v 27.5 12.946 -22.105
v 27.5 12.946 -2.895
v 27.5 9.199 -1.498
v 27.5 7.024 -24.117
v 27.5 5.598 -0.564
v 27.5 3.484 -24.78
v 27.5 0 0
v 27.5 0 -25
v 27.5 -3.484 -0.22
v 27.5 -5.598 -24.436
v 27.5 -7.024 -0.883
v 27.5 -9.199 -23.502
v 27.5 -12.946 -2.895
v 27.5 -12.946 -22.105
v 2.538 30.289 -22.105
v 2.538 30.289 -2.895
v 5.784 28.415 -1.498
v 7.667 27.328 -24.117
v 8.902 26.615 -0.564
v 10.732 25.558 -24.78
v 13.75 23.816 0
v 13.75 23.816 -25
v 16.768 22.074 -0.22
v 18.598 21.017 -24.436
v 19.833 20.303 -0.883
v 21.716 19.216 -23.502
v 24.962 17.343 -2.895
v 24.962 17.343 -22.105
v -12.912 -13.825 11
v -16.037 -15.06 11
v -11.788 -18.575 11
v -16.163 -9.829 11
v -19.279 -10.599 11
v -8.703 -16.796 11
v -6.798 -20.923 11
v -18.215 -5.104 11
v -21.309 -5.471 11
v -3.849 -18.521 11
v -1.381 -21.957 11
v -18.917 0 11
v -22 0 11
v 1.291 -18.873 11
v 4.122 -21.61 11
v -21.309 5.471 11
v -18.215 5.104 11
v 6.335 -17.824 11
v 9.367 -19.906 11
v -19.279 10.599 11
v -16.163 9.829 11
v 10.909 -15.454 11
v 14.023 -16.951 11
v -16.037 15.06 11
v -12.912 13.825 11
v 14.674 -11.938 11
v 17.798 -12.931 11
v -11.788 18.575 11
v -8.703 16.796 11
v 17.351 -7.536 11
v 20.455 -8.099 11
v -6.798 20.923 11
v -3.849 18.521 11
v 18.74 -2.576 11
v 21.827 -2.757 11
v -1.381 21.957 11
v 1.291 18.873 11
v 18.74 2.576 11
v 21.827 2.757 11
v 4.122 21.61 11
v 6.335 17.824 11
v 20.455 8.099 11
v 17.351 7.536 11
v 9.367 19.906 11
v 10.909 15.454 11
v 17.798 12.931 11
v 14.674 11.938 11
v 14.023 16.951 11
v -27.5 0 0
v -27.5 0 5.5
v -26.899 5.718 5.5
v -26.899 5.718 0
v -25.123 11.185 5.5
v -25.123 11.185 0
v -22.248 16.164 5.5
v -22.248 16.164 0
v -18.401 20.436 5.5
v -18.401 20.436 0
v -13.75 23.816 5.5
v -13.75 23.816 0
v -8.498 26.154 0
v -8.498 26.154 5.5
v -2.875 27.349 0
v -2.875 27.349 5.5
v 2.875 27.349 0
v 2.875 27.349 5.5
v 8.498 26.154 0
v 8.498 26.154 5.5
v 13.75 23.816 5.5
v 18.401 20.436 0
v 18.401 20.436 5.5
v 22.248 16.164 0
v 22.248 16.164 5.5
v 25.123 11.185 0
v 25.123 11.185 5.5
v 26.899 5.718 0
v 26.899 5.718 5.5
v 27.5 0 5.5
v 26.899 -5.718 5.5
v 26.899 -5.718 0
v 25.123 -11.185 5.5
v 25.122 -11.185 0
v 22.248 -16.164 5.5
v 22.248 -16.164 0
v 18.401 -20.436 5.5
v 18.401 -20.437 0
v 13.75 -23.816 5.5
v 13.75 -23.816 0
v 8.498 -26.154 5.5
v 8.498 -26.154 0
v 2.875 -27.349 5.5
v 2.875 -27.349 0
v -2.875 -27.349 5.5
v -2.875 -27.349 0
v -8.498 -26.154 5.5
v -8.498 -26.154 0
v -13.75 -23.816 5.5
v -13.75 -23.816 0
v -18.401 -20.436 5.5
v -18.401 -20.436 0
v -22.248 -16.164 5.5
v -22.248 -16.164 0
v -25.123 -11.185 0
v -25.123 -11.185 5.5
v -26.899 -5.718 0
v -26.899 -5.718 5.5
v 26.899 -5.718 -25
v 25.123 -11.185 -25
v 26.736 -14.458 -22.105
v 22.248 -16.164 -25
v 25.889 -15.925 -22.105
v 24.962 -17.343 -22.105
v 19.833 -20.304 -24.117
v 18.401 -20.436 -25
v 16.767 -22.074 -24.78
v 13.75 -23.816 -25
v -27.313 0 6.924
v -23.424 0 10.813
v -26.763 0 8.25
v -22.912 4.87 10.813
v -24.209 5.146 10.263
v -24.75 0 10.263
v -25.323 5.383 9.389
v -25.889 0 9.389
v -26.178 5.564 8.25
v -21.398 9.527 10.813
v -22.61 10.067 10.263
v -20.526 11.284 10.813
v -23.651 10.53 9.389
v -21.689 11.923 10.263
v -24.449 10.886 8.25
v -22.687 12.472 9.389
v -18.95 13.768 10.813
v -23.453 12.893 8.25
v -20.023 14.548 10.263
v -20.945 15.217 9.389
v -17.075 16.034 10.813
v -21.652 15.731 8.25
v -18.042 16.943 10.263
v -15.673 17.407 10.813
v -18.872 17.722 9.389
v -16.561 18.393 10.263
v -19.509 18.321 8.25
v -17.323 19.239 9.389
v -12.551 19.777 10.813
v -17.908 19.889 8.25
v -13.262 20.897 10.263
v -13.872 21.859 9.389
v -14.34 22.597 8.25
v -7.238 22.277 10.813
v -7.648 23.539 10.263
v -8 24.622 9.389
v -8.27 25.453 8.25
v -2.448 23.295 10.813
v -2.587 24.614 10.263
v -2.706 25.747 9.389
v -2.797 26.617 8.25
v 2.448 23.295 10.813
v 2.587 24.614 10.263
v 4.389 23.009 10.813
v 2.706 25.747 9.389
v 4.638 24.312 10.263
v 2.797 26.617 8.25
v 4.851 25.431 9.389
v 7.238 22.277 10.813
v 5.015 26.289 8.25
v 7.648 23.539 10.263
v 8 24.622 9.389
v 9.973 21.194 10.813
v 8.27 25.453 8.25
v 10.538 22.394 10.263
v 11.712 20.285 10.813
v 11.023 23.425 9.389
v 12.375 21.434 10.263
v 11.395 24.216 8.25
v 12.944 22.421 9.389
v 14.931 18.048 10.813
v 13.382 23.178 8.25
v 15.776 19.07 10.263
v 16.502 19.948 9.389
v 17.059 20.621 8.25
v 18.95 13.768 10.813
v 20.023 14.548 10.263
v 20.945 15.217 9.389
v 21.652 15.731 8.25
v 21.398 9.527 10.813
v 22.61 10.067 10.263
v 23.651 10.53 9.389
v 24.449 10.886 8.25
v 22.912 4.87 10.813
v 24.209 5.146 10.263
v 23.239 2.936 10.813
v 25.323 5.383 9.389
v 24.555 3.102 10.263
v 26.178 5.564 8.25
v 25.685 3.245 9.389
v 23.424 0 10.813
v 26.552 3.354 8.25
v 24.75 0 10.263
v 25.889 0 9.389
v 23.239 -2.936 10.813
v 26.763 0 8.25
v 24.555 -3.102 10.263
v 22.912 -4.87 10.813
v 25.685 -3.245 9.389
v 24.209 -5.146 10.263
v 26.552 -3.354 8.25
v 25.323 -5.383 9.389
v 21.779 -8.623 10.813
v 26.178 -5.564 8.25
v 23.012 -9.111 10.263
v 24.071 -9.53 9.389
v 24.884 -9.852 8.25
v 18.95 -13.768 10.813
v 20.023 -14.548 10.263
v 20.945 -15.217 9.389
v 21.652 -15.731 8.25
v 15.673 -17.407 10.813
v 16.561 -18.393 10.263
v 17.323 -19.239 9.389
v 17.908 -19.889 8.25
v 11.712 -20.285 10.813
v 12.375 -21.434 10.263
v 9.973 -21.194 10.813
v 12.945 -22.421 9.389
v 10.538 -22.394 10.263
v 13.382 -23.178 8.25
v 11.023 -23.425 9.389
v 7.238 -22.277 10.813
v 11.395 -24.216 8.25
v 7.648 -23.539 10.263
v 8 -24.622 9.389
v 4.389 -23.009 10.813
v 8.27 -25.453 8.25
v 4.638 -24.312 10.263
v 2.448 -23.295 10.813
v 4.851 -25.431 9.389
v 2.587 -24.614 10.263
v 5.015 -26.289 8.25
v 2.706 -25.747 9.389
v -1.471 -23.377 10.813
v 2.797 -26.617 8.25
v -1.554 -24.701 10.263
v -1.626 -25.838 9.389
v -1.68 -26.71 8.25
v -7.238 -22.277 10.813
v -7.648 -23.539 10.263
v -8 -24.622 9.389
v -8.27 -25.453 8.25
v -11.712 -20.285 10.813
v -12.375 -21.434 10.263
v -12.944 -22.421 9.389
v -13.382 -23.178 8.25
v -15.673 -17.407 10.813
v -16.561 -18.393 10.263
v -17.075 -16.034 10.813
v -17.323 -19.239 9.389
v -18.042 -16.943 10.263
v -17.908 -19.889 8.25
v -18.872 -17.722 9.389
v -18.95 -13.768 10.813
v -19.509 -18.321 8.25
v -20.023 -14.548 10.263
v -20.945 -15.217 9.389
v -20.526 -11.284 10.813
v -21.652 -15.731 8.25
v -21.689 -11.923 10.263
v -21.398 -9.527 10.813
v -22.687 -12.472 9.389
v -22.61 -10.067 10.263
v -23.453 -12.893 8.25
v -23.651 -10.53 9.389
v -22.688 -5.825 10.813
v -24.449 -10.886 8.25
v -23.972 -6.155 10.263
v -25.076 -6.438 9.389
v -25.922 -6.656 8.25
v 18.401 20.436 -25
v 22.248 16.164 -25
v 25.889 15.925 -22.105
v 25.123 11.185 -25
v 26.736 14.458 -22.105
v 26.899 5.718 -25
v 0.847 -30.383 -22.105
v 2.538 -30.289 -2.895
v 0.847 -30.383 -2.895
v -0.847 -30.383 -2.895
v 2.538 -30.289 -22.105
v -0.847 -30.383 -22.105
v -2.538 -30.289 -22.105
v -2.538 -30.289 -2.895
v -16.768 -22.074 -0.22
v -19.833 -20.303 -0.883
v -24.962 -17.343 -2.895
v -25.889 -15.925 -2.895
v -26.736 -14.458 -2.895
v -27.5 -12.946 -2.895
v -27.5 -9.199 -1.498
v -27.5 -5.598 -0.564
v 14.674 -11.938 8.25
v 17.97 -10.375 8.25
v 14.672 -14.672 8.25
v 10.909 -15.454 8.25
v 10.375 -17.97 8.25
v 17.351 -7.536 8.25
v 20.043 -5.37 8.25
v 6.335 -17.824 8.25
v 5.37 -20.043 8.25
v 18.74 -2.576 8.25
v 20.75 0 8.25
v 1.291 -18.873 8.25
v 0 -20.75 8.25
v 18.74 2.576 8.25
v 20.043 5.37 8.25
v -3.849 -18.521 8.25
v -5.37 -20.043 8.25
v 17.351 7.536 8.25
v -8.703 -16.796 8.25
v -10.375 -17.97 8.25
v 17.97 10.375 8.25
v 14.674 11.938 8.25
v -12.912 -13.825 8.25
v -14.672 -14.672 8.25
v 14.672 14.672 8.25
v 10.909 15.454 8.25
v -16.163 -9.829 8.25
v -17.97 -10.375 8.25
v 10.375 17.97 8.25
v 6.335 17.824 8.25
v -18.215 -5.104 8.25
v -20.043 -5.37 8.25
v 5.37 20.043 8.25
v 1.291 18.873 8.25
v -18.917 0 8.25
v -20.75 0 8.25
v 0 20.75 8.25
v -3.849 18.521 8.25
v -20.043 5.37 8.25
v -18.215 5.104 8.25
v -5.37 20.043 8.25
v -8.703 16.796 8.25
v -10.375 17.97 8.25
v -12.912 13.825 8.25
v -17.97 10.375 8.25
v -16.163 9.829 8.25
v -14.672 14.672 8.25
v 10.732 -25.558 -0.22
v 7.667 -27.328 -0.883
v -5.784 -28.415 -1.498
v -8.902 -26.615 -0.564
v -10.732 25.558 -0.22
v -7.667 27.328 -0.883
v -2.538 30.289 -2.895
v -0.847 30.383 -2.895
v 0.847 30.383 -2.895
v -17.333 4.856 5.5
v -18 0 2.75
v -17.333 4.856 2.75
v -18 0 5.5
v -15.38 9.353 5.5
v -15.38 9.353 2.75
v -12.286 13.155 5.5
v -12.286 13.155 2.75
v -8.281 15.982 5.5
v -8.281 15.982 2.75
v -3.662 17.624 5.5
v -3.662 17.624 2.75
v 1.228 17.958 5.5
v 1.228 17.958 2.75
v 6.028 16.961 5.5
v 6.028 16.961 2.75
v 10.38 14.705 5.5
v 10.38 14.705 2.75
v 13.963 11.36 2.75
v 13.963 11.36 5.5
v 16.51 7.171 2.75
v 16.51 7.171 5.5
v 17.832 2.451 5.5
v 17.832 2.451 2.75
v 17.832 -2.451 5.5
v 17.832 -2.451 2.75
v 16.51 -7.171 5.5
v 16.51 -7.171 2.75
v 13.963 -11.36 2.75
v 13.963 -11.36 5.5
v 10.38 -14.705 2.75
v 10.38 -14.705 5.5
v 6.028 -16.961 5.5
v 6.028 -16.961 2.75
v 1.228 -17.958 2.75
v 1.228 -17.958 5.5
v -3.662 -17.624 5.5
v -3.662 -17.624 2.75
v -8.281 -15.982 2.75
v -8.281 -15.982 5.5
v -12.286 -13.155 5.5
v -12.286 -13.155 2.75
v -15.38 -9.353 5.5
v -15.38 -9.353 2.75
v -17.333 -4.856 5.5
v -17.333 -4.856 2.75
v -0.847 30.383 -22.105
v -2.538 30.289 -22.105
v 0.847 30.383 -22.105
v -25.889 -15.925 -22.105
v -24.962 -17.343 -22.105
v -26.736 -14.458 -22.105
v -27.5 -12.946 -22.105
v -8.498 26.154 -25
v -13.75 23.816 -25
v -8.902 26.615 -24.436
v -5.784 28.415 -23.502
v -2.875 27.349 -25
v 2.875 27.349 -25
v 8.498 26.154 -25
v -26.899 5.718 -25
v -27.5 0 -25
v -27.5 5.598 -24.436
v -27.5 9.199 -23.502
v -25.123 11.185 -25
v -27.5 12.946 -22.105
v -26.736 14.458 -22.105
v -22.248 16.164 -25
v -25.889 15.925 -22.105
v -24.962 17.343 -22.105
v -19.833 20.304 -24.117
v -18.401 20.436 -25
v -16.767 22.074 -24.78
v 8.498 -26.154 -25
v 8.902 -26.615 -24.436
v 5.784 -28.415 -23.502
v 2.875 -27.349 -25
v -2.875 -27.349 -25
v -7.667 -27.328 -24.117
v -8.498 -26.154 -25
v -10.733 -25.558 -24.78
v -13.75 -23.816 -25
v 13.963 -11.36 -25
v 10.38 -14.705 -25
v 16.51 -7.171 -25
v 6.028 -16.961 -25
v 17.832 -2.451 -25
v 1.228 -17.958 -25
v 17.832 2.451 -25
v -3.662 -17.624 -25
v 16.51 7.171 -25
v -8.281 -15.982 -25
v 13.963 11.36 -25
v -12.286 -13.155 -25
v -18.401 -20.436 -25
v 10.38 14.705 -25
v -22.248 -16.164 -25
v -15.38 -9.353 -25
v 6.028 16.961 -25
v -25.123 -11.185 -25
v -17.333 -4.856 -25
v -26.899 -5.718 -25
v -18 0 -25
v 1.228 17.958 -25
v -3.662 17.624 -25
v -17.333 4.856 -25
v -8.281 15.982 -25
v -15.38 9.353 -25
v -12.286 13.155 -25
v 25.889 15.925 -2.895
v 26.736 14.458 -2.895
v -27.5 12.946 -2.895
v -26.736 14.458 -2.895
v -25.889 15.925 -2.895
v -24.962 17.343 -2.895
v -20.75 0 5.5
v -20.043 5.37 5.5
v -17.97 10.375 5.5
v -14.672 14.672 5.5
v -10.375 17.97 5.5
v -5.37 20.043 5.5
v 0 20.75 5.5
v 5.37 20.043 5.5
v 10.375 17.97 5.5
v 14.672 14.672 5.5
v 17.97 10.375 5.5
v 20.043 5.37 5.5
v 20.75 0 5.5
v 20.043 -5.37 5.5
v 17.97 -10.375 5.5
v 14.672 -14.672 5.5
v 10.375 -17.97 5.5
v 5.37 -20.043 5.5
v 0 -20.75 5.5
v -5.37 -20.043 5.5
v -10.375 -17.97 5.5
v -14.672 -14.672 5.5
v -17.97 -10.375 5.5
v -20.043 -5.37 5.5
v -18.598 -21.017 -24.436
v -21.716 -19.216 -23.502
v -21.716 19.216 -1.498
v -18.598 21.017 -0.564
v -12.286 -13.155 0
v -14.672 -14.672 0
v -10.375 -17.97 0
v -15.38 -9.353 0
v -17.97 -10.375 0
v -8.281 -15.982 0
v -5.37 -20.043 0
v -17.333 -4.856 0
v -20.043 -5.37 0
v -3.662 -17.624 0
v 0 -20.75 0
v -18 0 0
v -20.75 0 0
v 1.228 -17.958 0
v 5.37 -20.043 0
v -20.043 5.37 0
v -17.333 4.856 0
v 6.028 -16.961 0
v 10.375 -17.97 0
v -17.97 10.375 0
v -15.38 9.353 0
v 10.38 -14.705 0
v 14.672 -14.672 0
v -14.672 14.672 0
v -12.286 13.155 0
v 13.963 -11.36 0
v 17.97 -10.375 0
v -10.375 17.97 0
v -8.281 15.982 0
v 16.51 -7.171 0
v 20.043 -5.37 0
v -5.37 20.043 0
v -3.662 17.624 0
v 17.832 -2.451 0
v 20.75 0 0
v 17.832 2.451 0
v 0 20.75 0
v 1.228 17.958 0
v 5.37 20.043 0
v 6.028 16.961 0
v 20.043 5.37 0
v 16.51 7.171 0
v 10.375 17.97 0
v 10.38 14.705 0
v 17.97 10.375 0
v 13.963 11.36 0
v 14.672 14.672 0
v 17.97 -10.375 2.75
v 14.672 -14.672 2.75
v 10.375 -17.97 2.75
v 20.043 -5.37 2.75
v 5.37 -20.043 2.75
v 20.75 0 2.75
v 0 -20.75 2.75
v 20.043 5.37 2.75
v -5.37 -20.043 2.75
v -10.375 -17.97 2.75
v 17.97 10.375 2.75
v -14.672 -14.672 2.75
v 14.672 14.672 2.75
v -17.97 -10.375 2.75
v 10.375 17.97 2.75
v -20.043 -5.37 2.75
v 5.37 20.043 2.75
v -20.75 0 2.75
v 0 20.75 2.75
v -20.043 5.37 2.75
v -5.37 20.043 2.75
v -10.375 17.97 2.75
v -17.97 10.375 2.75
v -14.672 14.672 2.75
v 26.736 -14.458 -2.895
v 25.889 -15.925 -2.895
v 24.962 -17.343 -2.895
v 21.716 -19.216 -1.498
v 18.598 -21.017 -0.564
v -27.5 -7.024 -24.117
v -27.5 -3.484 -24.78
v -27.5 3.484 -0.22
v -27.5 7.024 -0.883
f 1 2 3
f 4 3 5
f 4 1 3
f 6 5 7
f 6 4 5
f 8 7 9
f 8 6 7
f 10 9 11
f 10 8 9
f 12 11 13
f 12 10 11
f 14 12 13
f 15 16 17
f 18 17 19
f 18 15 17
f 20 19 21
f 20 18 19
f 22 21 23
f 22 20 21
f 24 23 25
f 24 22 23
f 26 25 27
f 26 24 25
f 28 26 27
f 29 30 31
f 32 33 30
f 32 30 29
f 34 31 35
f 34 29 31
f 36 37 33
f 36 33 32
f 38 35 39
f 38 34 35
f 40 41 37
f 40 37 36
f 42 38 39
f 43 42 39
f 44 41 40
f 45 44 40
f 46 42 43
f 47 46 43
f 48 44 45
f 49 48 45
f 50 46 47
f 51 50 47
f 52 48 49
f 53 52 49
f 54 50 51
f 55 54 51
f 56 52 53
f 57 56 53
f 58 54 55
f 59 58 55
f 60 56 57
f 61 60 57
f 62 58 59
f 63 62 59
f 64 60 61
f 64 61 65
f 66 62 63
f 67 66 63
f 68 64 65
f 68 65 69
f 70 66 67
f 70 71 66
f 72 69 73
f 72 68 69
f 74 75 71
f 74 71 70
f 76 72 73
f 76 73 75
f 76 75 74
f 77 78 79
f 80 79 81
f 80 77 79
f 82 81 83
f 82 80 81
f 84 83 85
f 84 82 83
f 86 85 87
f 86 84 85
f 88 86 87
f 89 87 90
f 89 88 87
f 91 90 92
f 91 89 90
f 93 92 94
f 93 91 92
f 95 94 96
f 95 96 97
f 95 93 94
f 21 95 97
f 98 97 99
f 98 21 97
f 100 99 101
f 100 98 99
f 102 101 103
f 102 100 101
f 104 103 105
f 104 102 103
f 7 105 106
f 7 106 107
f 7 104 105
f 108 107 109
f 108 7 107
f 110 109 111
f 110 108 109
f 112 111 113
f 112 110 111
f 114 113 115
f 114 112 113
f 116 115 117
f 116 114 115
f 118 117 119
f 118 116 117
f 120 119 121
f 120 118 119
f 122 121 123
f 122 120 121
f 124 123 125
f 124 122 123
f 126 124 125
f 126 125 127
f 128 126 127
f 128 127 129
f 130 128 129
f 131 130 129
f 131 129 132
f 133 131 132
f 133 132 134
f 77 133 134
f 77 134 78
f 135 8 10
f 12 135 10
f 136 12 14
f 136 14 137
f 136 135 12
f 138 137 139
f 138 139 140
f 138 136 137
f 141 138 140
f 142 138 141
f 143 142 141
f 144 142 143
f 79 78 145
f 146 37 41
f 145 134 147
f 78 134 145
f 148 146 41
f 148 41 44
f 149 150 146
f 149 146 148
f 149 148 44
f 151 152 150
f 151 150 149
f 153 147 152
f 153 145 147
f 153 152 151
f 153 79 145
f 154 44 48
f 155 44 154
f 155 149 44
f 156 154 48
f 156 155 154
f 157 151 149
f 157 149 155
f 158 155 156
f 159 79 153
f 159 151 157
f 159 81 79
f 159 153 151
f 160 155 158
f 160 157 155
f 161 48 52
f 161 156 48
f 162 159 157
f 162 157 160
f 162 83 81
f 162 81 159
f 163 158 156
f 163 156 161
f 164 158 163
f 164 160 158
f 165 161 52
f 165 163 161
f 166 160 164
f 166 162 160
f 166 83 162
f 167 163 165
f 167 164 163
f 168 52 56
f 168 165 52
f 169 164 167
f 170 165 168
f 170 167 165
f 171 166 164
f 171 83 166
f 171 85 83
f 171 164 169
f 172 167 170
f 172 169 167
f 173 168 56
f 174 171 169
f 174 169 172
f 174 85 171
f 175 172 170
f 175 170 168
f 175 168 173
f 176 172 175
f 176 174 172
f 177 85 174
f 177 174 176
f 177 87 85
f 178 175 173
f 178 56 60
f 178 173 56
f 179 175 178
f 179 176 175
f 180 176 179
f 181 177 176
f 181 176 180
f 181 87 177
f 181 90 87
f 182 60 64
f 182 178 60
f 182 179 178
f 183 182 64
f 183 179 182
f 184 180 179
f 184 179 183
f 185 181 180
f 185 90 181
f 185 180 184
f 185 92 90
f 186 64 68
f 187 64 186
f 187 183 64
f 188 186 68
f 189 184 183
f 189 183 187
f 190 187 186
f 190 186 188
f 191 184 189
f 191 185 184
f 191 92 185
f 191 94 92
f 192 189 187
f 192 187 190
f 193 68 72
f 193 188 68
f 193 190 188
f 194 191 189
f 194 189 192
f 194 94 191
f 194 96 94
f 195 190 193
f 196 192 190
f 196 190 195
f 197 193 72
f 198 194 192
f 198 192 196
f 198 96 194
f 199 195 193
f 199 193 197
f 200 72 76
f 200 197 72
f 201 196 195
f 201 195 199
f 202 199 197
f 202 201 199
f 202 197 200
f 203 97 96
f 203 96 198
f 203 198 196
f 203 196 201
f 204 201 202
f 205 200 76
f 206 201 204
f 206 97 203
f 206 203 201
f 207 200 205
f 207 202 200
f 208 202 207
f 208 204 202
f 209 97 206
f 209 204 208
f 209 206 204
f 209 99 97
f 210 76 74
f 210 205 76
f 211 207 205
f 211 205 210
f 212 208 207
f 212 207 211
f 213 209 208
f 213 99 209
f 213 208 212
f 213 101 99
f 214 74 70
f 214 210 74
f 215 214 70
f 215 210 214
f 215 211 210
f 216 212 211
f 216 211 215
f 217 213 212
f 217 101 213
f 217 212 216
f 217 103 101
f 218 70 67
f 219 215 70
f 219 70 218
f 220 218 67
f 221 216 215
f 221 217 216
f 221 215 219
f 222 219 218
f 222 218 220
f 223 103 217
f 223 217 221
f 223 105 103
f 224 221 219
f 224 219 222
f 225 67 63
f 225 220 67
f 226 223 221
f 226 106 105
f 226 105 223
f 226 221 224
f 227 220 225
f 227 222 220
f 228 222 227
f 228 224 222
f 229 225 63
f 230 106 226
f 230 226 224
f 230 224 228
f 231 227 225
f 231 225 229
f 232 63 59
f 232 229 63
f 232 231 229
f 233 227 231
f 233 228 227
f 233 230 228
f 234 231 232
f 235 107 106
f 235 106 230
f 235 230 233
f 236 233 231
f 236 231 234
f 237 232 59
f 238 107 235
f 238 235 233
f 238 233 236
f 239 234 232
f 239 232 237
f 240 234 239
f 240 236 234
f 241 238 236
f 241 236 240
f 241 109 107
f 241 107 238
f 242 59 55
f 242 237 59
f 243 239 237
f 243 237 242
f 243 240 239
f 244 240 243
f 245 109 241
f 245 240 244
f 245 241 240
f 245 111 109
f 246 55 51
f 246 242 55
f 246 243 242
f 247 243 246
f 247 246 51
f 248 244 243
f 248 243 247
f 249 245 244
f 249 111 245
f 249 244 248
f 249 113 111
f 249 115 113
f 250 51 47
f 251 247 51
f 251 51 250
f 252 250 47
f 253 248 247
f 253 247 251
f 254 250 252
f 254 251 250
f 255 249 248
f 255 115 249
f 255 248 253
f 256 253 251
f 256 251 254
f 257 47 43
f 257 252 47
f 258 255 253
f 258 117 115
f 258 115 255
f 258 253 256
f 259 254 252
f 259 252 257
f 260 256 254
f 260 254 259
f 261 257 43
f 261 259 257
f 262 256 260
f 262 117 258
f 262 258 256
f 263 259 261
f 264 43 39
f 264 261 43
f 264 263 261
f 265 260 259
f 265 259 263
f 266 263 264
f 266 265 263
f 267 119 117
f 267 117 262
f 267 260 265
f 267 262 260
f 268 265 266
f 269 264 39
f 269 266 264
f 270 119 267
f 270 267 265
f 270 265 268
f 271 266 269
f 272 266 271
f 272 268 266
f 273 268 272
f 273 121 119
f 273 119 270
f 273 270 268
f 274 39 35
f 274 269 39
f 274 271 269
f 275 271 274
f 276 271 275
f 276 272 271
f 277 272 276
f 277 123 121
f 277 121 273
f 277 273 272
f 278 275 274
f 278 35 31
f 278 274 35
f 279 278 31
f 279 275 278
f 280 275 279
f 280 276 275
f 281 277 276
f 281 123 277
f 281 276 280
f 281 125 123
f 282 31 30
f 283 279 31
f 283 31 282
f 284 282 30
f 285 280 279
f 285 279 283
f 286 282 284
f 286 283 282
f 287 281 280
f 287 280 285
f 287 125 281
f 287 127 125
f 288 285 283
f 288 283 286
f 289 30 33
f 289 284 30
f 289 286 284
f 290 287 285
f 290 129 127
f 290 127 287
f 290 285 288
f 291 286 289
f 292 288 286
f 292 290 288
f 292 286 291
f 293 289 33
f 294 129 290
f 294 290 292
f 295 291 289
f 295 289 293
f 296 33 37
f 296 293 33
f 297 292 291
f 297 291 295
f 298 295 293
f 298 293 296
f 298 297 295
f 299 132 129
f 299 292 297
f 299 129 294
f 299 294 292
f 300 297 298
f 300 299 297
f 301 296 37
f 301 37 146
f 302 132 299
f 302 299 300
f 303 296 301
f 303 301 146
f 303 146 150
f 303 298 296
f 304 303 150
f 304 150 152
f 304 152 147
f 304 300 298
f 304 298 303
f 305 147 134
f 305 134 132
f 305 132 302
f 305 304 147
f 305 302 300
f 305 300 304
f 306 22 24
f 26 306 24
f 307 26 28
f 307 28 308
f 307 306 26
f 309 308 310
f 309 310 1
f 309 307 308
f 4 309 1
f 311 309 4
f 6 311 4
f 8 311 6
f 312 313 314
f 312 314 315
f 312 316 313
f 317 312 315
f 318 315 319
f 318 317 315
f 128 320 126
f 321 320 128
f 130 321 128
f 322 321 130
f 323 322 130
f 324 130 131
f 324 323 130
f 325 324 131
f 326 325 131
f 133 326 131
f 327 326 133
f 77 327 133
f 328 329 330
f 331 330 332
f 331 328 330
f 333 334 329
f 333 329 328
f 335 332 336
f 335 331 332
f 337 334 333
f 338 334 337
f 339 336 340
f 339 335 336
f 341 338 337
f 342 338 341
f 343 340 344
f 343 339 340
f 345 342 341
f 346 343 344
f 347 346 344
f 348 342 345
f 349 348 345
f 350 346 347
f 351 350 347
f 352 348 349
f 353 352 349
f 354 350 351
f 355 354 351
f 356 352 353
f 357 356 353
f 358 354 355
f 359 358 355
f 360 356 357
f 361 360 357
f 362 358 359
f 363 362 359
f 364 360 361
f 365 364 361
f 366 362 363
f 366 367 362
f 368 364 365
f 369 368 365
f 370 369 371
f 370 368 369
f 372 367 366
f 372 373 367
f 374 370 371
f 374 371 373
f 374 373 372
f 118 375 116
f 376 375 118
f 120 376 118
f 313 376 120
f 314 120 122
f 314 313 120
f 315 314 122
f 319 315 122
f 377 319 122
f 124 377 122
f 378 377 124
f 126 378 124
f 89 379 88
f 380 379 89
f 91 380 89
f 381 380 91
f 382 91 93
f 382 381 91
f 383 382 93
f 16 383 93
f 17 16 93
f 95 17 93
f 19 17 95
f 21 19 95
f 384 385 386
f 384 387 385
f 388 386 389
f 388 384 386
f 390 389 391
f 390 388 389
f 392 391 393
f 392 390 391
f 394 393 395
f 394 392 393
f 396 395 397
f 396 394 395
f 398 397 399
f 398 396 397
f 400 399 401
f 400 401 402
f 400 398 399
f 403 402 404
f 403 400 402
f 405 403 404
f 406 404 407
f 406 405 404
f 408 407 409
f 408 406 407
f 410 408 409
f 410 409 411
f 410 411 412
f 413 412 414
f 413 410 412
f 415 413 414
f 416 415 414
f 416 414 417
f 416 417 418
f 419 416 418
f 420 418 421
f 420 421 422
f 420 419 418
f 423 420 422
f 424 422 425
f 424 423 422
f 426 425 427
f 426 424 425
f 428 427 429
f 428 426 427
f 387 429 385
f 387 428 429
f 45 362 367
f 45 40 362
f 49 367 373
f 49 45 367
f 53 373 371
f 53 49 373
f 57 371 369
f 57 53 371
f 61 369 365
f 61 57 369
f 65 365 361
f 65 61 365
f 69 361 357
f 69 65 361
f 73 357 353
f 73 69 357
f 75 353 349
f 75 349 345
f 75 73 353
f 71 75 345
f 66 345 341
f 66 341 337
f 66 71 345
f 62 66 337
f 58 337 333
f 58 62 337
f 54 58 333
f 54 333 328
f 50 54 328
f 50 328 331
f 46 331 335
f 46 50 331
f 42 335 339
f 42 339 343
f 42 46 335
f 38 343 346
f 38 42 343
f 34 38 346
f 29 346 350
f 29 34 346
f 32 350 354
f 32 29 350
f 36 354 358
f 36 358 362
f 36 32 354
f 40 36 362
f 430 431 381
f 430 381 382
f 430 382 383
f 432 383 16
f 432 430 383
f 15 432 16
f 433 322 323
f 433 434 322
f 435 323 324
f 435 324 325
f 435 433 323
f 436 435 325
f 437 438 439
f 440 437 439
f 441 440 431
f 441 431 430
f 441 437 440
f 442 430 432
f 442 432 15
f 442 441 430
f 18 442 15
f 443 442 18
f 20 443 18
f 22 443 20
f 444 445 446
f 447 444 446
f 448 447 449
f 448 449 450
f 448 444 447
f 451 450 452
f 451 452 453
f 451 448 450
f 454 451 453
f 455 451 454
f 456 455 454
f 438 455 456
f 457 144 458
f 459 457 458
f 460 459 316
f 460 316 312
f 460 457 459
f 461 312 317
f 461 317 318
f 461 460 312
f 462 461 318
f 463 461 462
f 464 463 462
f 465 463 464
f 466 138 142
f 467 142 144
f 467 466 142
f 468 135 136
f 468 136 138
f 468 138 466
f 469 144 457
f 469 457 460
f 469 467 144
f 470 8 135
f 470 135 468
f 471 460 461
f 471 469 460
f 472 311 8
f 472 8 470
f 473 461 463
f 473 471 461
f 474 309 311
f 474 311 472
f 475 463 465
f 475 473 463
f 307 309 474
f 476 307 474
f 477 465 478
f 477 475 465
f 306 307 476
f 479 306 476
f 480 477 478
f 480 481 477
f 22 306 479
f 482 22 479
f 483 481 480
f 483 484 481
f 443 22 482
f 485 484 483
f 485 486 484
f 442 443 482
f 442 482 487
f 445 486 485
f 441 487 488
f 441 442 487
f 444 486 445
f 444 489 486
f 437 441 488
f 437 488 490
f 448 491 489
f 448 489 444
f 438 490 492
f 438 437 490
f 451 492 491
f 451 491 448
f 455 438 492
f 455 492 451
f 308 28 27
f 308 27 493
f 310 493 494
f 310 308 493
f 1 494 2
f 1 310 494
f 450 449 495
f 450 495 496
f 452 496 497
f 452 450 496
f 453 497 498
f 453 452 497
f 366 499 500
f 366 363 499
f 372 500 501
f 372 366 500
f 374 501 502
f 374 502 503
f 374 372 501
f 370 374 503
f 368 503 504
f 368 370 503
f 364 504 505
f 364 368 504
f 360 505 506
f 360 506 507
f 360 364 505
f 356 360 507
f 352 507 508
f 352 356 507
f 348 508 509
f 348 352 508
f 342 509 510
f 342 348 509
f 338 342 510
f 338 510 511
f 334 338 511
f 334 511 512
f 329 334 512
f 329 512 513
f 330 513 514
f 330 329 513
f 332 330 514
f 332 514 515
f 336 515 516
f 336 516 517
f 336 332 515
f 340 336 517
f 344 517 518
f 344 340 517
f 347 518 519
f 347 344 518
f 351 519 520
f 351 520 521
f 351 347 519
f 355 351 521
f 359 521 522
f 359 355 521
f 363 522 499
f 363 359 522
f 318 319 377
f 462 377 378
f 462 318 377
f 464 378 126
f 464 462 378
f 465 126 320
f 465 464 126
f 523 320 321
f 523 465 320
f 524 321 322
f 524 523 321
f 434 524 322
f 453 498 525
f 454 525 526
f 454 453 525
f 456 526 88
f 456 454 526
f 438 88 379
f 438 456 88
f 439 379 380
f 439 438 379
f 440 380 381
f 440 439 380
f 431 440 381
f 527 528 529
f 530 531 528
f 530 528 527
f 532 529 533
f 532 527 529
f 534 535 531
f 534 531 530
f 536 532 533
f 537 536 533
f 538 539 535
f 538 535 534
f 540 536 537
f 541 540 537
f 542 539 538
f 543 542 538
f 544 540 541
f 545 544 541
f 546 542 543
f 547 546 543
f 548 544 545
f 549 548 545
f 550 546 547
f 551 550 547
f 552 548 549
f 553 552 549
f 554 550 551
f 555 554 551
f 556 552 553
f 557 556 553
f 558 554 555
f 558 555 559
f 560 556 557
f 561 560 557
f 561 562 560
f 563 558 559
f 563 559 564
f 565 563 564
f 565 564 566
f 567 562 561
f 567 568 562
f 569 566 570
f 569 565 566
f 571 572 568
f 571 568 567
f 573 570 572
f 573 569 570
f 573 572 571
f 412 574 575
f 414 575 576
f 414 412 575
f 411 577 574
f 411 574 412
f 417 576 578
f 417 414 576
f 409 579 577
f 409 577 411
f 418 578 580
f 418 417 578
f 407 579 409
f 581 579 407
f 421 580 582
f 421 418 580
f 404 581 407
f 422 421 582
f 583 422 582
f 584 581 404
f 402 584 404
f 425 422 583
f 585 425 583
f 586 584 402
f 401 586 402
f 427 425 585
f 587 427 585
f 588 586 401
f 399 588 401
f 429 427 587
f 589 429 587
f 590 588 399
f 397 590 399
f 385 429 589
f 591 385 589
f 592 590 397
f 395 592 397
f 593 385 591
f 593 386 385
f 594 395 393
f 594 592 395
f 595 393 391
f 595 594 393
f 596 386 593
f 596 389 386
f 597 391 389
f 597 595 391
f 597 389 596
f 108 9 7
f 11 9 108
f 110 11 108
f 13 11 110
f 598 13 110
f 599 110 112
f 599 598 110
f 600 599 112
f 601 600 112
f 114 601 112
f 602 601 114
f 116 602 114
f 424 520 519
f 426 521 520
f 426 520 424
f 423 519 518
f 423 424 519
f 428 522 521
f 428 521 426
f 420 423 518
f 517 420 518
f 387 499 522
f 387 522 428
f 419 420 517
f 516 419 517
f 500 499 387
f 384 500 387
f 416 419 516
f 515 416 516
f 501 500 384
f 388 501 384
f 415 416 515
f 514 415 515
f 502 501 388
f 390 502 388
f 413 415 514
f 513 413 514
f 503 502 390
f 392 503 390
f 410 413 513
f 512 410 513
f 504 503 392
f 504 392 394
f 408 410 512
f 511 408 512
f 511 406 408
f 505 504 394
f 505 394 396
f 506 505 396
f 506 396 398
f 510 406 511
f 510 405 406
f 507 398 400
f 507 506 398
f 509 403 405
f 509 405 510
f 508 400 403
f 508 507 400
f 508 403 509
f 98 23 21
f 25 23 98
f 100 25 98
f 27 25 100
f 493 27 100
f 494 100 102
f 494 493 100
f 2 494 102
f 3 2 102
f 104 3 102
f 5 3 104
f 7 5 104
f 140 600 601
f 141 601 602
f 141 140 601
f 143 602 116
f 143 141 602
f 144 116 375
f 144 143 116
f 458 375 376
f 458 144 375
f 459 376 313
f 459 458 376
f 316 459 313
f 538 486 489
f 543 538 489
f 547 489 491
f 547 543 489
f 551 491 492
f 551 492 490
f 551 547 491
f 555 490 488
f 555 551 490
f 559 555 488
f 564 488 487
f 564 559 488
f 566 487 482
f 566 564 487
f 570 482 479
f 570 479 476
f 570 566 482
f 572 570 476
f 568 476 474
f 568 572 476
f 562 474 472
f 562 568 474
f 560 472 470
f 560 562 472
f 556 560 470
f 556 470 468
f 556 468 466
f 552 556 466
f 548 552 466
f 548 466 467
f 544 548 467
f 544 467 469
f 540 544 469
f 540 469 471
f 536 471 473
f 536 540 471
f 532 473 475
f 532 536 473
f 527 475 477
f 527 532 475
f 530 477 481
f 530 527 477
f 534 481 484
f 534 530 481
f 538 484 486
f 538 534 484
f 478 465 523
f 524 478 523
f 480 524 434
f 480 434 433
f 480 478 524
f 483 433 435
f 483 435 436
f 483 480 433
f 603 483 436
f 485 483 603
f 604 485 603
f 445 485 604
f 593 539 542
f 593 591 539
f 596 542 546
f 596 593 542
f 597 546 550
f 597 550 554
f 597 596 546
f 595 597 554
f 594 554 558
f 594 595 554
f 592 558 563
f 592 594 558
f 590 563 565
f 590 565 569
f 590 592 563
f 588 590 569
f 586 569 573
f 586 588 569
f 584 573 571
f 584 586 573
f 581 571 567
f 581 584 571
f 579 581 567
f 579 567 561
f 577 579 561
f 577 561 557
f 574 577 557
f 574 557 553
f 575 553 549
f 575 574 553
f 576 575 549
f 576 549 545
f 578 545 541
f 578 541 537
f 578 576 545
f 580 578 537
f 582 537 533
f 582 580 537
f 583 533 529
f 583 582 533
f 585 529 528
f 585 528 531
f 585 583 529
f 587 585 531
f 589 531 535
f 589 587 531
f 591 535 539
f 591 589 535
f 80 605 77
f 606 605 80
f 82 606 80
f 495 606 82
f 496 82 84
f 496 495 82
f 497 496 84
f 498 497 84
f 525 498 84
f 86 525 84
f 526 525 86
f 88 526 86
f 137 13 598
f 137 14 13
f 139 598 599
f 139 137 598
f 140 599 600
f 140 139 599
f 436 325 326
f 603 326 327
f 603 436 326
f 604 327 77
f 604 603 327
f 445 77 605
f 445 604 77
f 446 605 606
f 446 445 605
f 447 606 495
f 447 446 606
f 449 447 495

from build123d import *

# Parameters (mm, degrees)
EXTRUDE_2_DEPTH = 36


with BuildPart() as part:
    # Эскиз2 → Повернуть1 (revolve)
    with BuildSketch(Plane(origin=(0, 0, 0), x_dir=(1, 0, 0), z_dir=(0, 1, 0))):
        with BuildLine():
            Line((-18, 25), (-18, 0))
            Line((-18, 0), (-20.75, 0))
            Line((-20.75, 0), (-20.75, -2.75))
            Line((-20.75, -2.75), (-18, -2.75))
            Line((-18, -2.75), (-18, -5.5))
            Line((-18, -5.5), (-20.75, -5.5))
            Line((-20.75, -5.5), (-20.75, -8.25))
            Line((-20.75, -8.25), (-18.916666667, -8.25))
            Line((-18.916666667, -8.25), (-18.916666667, -11))
            Line((-18.916666667, -11), (-22, -11))
            ThreePointArc((-22, -11), (-25.889087297, -9.389087297), (-27.5, -5.5))
            Line((-27.5, -5.5), (-27.5, 0))
            Line((-27.5, 0), (-30.395, 2.895))
            Line((-30.395, 2.895), (-30.395, 22.105))
            Line((-30.395, 22.105), (-27.5, 25))
            Line((-27.5, 25), (-18, 25))
        make_face()
    revolve(axis=Axis((0, 0, 84.230364838), (0, 0, -1)))


with BuildPart() as body_2:
    # Эскиз3 → Бобышка-Вытянуть2 (new body)
    with BuildSketch(Plane(origin=(0, 0, -25), x_dir=(-1, 0, 0), z_dir=(0, 0, -1))):
        Polygon((0, -31.754264805), (27.5, -15.877132403), (27.5, 15.877132403), (0, 31.754264805), (-27.5, 15.877132403), (-27.5, -15.877132403), align=None)
    extrude(amount=-EXTRUDE_2_DEPTH)


with BuildPart() as part_1:
    add(part.part)

    # Combine 1: intersect body 2
    add(body_2.part, mode=Mode.INTERSECT)


solid = part_1.part
